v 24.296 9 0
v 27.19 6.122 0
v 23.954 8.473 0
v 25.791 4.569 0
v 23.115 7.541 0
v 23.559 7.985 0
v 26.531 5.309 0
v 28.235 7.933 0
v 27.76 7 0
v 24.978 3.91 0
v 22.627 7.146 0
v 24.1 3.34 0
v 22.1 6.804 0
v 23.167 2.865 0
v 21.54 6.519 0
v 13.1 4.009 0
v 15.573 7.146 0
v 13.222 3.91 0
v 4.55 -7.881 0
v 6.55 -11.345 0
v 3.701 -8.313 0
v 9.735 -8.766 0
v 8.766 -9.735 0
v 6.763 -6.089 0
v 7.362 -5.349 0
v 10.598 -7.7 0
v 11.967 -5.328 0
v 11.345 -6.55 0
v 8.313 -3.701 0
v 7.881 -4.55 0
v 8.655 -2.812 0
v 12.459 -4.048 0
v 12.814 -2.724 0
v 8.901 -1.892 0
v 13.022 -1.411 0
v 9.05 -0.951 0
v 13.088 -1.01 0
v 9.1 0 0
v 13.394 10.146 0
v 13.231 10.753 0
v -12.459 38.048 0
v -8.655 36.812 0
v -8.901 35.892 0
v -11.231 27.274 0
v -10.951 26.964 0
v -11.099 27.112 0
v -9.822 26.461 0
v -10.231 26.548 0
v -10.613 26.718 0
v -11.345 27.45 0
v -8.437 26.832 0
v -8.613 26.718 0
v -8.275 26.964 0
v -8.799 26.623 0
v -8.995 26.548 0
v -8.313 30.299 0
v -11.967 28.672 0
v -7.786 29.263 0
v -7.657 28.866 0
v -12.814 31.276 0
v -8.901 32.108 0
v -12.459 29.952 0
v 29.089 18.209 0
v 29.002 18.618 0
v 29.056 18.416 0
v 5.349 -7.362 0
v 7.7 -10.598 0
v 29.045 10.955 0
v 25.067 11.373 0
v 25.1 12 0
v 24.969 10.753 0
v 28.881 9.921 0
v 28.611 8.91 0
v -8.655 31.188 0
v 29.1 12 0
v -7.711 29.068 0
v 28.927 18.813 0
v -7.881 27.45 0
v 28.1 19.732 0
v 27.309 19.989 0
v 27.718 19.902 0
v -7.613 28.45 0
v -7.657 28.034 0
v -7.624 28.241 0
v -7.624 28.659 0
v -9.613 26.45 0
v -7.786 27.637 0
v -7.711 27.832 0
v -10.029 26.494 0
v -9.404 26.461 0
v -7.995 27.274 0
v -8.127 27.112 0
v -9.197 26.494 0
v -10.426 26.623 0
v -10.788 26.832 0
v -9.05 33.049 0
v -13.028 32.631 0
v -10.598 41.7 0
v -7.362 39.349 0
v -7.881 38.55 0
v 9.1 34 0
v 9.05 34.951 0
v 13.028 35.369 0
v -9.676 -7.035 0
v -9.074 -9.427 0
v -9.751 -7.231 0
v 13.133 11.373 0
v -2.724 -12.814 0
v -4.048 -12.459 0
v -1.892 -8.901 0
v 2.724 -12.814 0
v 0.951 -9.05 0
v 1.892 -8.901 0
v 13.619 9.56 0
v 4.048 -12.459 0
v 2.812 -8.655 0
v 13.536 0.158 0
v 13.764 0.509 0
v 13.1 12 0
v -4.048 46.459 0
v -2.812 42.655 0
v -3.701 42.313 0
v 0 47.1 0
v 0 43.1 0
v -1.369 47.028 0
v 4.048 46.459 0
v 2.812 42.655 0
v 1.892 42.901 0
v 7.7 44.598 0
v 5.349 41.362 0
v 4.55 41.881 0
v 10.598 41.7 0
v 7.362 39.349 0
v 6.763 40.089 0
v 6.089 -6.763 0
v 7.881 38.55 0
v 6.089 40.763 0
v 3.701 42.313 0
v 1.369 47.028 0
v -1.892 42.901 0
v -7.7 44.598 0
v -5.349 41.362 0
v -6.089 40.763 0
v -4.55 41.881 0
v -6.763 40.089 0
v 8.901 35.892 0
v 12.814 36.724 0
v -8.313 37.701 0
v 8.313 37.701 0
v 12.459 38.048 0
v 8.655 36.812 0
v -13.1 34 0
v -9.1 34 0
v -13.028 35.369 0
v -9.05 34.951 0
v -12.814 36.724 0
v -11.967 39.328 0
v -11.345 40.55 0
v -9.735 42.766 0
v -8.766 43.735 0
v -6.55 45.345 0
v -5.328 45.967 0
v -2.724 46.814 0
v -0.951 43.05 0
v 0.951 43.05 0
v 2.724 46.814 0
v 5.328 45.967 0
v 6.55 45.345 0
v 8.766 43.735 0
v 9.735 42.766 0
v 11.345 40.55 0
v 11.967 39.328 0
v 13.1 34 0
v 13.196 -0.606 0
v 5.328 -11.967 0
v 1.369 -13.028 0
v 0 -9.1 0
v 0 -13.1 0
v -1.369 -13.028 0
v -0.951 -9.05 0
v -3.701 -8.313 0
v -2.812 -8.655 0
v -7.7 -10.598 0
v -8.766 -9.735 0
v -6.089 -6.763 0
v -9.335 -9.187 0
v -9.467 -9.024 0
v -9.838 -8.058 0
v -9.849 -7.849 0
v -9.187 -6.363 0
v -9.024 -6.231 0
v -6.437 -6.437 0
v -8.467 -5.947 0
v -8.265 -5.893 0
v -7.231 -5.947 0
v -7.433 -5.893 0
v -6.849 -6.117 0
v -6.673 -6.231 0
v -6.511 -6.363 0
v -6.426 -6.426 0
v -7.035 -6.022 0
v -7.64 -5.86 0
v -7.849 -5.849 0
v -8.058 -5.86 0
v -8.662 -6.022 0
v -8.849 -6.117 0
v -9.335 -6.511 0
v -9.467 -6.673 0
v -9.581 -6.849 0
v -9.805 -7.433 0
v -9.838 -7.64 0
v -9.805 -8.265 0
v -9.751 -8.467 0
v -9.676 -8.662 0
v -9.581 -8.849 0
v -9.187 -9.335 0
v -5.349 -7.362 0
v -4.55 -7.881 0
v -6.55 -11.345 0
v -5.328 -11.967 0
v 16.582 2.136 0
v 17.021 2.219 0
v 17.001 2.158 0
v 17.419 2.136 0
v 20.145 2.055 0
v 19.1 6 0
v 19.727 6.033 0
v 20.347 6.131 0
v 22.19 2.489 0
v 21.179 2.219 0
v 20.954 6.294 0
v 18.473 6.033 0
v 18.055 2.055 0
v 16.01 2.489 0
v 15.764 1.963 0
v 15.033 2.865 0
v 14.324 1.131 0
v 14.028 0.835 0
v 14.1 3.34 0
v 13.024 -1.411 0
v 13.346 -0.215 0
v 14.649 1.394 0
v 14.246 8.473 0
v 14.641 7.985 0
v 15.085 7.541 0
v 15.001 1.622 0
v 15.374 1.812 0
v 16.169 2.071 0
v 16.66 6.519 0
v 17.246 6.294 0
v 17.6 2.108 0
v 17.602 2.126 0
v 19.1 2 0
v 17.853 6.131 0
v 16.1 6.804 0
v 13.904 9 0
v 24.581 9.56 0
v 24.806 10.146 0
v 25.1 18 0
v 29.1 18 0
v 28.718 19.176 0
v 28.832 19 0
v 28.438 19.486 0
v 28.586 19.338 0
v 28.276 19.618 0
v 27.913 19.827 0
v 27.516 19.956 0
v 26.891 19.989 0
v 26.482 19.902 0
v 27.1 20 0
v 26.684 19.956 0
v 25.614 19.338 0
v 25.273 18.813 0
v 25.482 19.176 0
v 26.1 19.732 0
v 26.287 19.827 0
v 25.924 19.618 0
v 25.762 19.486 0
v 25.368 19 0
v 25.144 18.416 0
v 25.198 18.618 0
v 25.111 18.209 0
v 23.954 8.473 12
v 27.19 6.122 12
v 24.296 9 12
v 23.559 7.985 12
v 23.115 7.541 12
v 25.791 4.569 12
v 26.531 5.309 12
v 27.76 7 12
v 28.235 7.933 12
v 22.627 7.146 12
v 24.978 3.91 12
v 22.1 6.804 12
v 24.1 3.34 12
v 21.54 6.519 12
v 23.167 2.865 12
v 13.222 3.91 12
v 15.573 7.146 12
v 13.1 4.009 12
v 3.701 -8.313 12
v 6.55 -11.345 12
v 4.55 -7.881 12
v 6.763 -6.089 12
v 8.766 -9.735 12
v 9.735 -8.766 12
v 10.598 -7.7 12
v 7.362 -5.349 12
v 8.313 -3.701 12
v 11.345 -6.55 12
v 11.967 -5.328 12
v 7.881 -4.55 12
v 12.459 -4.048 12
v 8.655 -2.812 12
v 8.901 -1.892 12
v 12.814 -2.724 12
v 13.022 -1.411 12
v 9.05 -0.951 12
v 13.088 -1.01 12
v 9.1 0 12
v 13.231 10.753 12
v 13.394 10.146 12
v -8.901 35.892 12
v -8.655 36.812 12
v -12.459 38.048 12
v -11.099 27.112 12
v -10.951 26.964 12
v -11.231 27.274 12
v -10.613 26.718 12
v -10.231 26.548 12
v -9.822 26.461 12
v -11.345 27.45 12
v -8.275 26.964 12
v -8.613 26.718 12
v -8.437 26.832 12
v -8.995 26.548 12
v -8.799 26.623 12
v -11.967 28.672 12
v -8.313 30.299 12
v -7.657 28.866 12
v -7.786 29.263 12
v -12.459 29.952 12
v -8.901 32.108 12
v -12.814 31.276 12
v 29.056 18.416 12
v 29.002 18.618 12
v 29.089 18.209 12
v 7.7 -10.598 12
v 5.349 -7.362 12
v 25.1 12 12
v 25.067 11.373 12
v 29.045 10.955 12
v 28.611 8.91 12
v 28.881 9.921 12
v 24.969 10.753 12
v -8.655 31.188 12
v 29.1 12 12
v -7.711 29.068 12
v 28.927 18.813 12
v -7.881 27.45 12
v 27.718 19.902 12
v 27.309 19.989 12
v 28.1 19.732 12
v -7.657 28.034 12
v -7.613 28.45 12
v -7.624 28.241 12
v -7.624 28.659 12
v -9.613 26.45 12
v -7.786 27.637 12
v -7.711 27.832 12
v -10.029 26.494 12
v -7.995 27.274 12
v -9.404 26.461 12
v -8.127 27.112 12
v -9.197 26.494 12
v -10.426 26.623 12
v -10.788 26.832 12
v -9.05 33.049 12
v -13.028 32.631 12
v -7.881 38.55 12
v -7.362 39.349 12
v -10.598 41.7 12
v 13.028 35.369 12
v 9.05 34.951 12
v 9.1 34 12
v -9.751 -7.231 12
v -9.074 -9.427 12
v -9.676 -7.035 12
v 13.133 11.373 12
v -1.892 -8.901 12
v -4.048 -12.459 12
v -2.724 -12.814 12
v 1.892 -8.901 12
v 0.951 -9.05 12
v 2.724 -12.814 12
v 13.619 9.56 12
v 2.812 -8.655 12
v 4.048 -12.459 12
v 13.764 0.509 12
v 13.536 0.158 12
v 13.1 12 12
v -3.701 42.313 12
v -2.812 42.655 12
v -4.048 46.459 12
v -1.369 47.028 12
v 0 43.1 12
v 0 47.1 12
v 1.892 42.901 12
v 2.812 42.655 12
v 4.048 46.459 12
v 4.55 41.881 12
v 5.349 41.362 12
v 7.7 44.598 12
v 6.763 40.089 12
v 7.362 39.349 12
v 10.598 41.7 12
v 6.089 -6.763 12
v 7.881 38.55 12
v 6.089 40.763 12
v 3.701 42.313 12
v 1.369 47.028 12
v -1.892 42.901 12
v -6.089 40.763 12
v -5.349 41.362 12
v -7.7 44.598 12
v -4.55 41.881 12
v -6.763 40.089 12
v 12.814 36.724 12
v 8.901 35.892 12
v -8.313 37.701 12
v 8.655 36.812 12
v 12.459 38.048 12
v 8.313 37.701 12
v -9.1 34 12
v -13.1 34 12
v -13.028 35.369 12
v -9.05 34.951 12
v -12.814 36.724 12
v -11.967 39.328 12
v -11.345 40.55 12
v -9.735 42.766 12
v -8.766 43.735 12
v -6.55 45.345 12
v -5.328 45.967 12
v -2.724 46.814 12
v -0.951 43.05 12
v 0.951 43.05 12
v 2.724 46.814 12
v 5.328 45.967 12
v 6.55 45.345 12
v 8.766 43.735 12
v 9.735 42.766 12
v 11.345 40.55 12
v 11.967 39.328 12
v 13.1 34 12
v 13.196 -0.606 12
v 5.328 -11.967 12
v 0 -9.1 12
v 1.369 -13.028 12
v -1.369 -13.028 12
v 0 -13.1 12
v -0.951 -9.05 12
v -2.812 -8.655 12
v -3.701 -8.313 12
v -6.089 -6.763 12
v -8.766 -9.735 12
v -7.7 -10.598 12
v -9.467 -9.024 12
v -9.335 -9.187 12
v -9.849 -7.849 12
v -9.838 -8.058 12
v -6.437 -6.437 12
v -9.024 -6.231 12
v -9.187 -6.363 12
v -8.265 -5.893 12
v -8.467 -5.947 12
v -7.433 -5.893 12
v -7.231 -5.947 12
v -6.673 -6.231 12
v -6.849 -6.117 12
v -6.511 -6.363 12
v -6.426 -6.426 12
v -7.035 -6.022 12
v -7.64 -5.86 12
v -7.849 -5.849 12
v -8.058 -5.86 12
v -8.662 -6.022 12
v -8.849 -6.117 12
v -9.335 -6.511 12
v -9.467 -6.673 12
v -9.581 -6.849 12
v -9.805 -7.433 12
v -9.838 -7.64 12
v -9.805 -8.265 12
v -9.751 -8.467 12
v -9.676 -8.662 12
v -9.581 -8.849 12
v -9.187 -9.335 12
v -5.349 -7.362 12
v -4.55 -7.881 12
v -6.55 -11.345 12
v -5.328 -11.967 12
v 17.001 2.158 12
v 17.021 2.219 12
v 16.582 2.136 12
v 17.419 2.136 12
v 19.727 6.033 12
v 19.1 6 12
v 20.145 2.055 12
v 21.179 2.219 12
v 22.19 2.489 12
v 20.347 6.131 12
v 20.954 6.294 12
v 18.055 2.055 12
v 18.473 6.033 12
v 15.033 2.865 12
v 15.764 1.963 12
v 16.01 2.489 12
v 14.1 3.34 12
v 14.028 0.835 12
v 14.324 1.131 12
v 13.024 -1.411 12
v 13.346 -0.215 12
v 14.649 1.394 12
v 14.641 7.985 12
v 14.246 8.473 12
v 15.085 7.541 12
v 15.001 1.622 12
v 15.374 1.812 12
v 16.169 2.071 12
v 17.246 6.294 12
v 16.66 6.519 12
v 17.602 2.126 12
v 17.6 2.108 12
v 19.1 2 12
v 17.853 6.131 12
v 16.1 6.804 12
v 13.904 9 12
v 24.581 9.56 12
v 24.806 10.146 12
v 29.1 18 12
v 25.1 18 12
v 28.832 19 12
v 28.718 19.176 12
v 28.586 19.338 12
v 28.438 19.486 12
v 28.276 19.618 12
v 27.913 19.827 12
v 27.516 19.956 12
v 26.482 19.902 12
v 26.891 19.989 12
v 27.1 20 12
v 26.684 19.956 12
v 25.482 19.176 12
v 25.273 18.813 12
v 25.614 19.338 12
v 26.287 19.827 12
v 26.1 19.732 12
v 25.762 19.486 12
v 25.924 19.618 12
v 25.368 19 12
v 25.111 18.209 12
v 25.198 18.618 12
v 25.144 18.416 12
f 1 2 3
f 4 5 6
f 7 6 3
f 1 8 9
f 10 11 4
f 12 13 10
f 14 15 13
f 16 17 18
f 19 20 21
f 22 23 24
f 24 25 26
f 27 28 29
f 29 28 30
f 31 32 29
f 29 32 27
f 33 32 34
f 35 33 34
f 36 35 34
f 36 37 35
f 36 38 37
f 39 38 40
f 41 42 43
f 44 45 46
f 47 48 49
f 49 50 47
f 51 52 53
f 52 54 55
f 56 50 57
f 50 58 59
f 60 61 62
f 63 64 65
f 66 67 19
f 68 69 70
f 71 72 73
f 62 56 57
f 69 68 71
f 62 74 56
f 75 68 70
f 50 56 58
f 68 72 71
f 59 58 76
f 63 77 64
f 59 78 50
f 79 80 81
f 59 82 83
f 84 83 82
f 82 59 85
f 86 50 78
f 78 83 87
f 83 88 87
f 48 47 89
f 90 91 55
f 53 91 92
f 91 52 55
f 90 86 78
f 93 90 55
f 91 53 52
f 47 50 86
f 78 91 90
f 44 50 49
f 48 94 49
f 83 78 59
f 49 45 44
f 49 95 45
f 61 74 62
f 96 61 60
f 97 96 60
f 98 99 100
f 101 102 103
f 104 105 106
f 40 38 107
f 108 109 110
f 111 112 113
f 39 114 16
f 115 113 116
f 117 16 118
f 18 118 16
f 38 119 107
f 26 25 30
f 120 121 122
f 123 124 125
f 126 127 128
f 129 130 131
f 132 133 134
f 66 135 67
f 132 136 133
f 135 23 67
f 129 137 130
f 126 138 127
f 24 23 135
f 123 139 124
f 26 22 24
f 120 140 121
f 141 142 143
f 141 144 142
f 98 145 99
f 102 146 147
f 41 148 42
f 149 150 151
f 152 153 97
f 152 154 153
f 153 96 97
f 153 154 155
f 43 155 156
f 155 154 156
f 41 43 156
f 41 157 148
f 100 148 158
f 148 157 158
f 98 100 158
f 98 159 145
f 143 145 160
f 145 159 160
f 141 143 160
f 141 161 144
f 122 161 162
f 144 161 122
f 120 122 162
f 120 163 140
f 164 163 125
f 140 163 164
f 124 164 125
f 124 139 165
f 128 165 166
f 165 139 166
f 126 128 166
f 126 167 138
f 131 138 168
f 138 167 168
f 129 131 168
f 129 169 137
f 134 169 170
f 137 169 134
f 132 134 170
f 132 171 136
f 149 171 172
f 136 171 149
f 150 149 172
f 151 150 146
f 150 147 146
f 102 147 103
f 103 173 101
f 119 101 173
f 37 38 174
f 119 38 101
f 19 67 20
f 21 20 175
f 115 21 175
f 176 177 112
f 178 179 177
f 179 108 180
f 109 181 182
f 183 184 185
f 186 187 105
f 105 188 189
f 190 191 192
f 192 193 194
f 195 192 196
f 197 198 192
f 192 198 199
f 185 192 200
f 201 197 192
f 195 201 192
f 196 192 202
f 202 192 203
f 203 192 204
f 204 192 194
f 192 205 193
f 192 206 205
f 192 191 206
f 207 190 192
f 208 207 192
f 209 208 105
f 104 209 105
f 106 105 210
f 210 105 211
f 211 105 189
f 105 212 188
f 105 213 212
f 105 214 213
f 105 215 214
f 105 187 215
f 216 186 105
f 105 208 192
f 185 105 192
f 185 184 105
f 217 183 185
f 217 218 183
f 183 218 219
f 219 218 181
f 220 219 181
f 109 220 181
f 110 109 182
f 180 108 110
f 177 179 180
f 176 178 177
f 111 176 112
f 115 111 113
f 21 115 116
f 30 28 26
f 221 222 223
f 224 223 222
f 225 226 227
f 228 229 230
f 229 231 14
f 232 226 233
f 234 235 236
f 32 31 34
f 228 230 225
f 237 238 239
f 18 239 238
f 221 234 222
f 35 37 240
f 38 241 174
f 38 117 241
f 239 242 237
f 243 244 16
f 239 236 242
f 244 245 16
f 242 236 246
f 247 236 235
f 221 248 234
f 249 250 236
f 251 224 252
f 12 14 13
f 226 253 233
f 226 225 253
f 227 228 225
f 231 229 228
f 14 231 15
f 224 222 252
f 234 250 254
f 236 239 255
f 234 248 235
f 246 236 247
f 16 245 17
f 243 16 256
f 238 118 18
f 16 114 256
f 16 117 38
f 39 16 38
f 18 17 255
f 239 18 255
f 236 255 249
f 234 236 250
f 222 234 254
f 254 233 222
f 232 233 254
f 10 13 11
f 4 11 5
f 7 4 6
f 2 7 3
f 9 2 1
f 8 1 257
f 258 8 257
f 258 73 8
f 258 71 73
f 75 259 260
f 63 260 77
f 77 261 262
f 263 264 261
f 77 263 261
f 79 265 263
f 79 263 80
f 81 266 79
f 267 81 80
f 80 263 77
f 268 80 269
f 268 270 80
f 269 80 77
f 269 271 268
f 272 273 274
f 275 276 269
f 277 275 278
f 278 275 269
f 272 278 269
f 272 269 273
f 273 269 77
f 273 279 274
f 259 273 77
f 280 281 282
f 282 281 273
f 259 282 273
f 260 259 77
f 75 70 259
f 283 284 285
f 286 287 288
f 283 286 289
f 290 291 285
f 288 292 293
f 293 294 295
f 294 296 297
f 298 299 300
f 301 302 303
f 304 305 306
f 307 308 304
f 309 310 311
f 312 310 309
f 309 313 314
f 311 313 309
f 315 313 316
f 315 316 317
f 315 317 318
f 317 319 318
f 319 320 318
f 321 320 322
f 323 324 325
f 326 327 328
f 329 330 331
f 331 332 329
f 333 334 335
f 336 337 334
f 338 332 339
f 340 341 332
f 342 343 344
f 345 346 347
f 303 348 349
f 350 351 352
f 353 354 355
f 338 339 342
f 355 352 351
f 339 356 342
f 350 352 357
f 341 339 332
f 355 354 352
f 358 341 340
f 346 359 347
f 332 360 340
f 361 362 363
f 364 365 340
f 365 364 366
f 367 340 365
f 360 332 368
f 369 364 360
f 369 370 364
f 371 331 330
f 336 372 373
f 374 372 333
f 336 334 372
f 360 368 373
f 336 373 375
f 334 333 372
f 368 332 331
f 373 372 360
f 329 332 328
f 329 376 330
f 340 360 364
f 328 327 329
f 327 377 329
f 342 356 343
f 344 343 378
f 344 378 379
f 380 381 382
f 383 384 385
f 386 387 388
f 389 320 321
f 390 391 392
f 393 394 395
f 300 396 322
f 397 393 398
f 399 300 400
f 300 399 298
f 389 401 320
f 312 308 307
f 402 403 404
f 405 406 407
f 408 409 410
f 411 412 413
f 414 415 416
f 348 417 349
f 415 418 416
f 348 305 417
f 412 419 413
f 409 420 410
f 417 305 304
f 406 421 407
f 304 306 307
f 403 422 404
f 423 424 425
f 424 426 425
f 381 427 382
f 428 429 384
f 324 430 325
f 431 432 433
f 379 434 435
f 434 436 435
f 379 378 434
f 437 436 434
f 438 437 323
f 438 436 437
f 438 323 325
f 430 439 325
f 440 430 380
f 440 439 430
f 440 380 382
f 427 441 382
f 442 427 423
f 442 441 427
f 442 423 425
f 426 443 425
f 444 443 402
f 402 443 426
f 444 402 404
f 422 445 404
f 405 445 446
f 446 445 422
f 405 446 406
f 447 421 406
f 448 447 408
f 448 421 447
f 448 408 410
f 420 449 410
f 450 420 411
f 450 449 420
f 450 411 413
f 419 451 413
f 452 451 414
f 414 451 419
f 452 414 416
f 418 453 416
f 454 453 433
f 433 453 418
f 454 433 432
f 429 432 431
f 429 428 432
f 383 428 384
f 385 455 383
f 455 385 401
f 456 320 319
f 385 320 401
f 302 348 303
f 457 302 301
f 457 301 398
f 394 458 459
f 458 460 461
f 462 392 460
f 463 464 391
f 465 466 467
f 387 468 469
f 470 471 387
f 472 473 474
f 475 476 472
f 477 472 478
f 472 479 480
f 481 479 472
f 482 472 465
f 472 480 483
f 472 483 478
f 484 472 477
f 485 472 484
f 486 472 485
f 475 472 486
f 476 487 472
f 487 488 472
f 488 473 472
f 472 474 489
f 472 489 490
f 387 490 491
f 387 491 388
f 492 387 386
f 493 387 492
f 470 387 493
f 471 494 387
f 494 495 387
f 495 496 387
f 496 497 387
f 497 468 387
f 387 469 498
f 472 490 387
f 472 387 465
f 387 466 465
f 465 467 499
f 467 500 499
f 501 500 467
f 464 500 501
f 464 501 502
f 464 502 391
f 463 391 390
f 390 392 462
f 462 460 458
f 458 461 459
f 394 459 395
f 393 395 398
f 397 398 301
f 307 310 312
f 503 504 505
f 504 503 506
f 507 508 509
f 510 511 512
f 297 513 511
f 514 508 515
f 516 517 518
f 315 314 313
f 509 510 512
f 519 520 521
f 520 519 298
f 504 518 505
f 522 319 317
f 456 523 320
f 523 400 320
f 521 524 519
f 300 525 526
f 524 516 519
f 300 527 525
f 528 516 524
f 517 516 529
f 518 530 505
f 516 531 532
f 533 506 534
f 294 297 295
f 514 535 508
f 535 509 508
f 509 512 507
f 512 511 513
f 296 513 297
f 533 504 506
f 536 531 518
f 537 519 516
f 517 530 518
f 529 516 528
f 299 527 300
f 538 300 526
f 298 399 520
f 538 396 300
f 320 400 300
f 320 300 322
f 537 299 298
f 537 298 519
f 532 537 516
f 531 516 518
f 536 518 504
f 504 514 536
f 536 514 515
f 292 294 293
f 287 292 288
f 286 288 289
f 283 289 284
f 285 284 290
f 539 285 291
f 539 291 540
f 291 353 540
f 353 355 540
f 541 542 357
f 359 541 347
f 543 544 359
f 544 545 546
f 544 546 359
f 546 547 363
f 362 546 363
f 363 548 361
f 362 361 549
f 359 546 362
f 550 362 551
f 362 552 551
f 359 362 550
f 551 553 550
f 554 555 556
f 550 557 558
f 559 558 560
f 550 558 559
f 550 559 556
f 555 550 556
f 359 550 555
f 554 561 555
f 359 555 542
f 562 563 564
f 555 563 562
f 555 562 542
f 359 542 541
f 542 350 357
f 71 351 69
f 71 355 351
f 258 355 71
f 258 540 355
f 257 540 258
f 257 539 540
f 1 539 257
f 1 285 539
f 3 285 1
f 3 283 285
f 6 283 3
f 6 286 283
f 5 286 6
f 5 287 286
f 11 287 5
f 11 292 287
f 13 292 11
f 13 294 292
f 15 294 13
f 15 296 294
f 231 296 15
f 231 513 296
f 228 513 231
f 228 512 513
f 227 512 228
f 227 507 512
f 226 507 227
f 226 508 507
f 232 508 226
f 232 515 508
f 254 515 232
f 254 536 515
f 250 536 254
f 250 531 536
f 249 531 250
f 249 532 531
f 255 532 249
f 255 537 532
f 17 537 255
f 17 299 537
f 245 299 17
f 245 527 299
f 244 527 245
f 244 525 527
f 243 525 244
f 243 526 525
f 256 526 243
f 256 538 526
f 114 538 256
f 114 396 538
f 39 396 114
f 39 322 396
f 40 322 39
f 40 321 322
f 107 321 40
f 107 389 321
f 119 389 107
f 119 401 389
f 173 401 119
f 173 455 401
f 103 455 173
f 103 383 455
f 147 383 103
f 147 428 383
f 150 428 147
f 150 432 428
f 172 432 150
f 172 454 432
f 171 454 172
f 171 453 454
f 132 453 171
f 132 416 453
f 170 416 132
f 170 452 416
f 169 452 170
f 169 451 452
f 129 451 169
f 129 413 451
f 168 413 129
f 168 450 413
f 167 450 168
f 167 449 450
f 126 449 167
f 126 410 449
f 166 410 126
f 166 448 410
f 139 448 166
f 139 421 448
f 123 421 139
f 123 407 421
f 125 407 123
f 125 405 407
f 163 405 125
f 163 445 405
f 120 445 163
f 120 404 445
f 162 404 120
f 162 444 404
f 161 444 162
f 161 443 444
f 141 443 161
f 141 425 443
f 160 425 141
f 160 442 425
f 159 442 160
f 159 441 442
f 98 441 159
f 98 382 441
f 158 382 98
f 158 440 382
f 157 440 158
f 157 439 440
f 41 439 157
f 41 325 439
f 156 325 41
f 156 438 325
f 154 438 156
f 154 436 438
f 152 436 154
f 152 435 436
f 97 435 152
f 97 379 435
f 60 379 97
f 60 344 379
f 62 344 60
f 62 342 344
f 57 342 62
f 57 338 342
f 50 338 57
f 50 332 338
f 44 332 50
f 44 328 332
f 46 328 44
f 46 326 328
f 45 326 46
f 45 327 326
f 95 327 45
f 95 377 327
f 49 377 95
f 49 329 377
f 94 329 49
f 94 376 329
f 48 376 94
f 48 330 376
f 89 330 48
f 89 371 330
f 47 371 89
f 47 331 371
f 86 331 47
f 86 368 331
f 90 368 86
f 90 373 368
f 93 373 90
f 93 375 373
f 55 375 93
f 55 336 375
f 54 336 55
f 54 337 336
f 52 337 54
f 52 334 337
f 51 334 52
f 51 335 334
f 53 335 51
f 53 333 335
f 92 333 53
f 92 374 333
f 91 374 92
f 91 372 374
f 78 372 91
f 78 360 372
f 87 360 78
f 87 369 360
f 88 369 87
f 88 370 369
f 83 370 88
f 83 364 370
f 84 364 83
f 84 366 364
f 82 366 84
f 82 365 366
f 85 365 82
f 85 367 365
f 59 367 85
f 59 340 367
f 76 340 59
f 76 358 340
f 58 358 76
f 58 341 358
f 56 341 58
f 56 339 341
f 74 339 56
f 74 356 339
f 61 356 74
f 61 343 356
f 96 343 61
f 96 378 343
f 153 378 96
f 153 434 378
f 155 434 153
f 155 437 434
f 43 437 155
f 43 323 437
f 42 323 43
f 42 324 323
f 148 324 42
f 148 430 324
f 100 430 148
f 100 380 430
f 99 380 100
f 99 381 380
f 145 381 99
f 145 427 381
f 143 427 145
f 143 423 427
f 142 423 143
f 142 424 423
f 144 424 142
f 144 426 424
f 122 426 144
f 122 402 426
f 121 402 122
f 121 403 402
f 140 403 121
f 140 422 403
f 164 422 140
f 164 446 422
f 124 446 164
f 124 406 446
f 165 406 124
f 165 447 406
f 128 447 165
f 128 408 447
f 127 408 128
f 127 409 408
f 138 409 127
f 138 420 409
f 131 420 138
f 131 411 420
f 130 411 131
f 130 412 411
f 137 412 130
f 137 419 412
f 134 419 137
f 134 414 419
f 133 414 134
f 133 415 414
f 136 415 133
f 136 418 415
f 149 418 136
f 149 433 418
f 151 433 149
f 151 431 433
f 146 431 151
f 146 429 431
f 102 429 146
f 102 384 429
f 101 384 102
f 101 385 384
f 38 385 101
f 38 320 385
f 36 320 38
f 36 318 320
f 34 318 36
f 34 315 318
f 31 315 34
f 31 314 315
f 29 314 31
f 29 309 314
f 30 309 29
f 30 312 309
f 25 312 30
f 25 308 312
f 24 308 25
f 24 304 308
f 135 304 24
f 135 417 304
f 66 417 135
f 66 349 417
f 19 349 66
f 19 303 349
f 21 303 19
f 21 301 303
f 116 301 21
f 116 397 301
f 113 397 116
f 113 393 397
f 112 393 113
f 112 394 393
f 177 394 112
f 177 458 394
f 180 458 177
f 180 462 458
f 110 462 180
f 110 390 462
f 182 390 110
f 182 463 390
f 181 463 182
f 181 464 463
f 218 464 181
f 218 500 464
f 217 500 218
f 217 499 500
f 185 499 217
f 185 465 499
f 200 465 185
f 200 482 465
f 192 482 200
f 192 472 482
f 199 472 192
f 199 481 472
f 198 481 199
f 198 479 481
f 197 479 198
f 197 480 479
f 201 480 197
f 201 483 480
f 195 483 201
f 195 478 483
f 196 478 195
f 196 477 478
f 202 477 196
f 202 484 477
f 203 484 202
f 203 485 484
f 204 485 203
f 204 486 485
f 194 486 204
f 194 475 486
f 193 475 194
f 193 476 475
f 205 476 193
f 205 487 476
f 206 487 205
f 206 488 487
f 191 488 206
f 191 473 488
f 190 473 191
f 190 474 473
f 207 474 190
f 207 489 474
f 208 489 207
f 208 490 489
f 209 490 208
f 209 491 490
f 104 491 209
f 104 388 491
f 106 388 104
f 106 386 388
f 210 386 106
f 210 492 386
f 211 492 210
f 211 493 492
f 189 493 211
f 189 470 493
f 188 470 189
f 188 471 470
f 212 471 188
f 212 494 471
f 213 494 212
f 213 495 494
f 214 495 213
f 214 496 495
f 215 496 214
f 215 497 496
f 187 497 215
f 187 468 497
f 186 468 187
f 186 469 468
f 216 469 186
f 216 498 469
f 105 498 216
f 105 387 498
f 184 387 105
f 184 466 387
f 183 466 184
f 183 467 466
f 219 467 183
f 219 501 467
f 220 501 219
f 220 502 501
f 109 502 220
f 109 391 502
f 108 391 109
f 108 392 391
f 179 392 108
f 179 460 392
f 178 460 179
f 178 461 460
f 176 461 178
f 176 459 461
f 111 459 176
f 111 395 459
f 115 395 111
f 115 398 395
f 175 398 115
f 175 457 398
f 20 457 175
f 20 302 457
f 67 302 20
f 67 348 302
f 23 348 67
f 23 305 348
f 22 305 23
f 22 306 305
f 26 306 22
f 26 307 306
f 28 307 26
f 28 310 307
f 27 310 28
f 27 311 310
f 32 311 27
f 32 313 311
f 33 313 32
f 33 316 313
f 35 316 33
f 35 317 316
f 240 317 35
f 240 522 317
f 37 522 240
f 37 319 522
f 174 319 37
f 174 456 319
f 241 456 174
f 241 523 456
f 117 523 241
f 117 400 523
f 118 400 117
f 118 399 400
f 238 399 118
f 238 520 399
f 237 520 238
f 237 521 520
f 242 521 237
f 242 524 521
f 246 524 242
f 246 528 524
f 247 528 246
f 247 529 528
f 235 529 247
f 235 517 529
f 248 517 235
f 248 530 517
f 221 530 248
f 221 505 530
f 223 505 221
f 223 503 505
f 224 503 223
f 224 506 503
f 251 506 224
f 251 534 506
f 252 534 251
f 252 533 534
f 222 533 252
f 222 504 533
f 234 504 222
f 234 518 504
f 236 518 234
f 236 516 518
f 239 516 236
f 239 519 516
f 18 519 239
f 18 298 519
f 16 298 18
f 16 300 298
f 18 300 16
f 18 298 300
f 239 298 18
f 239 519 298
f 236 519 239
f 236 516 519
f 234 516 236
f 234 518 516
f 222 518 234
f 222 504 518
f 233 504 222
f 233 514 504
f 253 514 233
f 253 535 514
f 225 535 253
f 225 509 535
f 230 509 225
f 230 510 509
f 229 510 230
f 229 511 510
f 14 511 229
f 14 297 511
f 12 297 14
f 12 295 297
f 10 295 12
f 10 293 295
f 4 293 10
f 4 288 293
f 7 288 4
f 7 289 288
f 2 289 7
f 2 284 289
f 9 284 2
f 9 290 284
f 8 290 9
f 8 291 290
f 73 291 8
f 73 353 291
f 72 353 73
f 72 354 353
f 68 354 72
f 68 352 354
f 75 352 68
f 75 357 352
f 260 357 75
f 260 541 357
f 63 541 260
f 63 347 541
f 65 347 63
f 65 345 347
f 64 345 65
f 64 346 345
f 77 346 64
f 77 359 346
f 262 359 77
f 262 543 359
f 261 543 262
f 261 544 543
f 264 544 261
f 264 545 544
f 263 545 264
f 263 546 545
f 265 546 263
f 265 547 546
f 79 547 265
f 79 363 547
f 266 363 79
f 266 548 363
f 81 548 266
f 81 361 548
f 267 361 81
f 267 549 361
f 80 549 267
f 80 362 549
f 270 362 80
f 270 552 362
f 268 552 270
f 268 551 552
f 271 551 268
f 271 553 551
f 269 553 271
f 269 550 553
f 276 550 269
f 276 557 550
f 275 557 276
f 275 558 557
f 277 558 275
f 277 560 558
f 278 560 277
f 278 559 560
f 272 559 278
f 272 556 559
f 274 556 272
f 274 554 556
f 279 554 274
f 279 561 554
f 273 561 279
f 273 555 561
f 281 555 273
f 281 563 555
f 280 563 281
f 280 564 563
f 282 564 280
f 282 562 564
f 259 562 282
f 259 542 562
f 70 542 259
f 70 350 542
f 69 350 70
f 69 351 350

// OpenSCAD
diameter=18.2; // measured : bar diameter
distance=52.2; // measured : distance between the bars (including bars)
thickness=4; // wall thickness
space_h=12; // front hook distance
shift_h=12; // front hook shift
height_h=6; // front hook height
alpha_t=210; // top hook angle
alpha_b=135; // bottom hook angle
radius_r=4; // rounding radius
$fn=60;
width=12; // width of the hook

radius_b=diameter/2;
distance_b=distance-2*radius_b;
radius_h=space_h/2;

module part_square(p_size,p_alpha) {
if (p_alpha < 0)
    mirror([0,1]) part_square(p_size,-p_alpha);
else if (p_alpha > 360)
    part_square(p_size,p_alpha-360);
else if (p_alpha > 180) {
        translate([-p_size,0]) square([2*p_size,p_size]);
        rotate(180) part_square(p_size,p_alpha-180);
    }
else if (p_alpha > 90) {
        square([p_size,p_size]);
        rotate(90) part_square(p_size,p_alpha-90);
    }
else if (p_alpha > 45)
    difference() {
        square([p_size,p_size]);
        mirror([1,-1]) part_square(p_size,90-p_alpha);
    }
else
    polygon([[0,0],[p_size,0],[p_size,tan(p_alpha)*p_size]]);
}

module part_ring(p_radius,p_thickness,p_alpha) {
    p_length=p_radius+p_thickness;
    intersection() {
        difference() {
            circle(p_length);
            circle(p_radius);
        }
        part_square(p_length,p_alpha);
    }
}

function vector(p_radius,p_alpha) = [p_radius*cos(p_alpha),p_radius*sin(p_alpha)];

function circle_intersection(c1,r1,c2,r2) = 
let( x1=c1[0], y1=c1[1], x2=c2[0], y2=c2[1],
x0=x2-x1,                                      // difference in x coordinates
y0=y2-y1,                                      // difference in y coordinates
r=sqrt(pow(x0,2)+pow(y0,2)),                   // distance between centers
m1=(pow(r,2)+pow(r1,2)-pow(r2,2))/2/r,         // distance from center 1 to line
m2=sqrt(pow(r1,2)-pow(m1,2)))
   [x1+x0*m1/r+y0*m2/r,y1+y0*m1/r-x0*m2/r];    // right point
// [x1+x0*m1/r-y0*m2/r,y1+y0*m1/r+x0*m2/r];    // left point

module circle_2(p1,p2,c1,r1,c2,r2) {
    difference() {
        polygon([p1,p2,c1,c2]);
        translate(c1) circle(r1);
        translate(c2) circle(r2);
    }
}

module circle_3(c1,r1,c2,r2,c3,r3) {
    difference() {
        polygon([c1,[c1[0]+r1,c1[1]],[c2[0]-r2,c2[1]],c2,c3]);
        translate(c1) circle(r1);
        translate(c2) circle(r2);
        translate(c3) circle(r3);
    }
}

r_thickness=thickness/2;
r_length_b=radius_b+r_thickness;
r_length_h=radius_h+r_thickness;
v_center=circle_intersection(
    [0,0],radius_b+thickness+radius_r,
    [radius_b+radius_h+thickness,shift_h],radius_h+thickness+radius_r
);
y1_center=sqrt(4*radius_h*radius_r+thickness*(2*radius_h+2*radius_r+thickness));
y2_center=sqrt(4*radius_b*radius_r+thickness*(2*radius_b+2*radius_r+thickness));

linear_extrude(width){
    translate([0,distance_b]) {
        part_ring(radius_b,thickness,alpha_t);
        translate(vector(radius_b+r_thickness,alpha_t)) circle(r_thickness);
    }
    translate([radius_b,0]) square([thickness,max(distance_b,shift_h)]);
    if (shift_h < 0)
        translate([radius_b,0]) mirror([0,1]) square([thickness,-shift_h]);
    part_ring(radius_b,thickness,-alpha_b);
    translate(vector(radius_b+r_thickness,-alpha_b)) circle(r_thickness);
    translate([radius_b+radius_h+thickness,shift_h]) rotate(180)
        part_ring(radius_h,thickness,180);
    translate([radius_b+2*radius_h+thickness,shift_h]) square([thickness,height_h]);
    translate([radius_b+2*radius_h+3*r_thickness,shift_h+height_h]) circle(r_thickness);

    if (shift_h > radius_h+thickness+radius_r)
        circle_2 (
            [radius_b+thickness,shift_h-y1_center],
            [radius_b+thickness,shift_h],
            [radius_b+radius_h+thickness,shift_h],radius_h+thickness,
            [radius_b+radius_r+thickness,shift_h-y1_center],radius_r
        );
    else if (-shift_h > radius_b+thickness+radius_r)
        circle_2 (
            [radius_b,-y2_center],
            [radius_b,0],
            [0,0],radius_b+thickness,
            [radius_b-radius_r,-y2_center],radius_r
        );
    else
        circle_3 (
            [0,0],radius_b+thickness,
            [radius_b+radius_h+thickness,shift_h],radius_h+thickness,
            v_center,radius_r
        );

}
